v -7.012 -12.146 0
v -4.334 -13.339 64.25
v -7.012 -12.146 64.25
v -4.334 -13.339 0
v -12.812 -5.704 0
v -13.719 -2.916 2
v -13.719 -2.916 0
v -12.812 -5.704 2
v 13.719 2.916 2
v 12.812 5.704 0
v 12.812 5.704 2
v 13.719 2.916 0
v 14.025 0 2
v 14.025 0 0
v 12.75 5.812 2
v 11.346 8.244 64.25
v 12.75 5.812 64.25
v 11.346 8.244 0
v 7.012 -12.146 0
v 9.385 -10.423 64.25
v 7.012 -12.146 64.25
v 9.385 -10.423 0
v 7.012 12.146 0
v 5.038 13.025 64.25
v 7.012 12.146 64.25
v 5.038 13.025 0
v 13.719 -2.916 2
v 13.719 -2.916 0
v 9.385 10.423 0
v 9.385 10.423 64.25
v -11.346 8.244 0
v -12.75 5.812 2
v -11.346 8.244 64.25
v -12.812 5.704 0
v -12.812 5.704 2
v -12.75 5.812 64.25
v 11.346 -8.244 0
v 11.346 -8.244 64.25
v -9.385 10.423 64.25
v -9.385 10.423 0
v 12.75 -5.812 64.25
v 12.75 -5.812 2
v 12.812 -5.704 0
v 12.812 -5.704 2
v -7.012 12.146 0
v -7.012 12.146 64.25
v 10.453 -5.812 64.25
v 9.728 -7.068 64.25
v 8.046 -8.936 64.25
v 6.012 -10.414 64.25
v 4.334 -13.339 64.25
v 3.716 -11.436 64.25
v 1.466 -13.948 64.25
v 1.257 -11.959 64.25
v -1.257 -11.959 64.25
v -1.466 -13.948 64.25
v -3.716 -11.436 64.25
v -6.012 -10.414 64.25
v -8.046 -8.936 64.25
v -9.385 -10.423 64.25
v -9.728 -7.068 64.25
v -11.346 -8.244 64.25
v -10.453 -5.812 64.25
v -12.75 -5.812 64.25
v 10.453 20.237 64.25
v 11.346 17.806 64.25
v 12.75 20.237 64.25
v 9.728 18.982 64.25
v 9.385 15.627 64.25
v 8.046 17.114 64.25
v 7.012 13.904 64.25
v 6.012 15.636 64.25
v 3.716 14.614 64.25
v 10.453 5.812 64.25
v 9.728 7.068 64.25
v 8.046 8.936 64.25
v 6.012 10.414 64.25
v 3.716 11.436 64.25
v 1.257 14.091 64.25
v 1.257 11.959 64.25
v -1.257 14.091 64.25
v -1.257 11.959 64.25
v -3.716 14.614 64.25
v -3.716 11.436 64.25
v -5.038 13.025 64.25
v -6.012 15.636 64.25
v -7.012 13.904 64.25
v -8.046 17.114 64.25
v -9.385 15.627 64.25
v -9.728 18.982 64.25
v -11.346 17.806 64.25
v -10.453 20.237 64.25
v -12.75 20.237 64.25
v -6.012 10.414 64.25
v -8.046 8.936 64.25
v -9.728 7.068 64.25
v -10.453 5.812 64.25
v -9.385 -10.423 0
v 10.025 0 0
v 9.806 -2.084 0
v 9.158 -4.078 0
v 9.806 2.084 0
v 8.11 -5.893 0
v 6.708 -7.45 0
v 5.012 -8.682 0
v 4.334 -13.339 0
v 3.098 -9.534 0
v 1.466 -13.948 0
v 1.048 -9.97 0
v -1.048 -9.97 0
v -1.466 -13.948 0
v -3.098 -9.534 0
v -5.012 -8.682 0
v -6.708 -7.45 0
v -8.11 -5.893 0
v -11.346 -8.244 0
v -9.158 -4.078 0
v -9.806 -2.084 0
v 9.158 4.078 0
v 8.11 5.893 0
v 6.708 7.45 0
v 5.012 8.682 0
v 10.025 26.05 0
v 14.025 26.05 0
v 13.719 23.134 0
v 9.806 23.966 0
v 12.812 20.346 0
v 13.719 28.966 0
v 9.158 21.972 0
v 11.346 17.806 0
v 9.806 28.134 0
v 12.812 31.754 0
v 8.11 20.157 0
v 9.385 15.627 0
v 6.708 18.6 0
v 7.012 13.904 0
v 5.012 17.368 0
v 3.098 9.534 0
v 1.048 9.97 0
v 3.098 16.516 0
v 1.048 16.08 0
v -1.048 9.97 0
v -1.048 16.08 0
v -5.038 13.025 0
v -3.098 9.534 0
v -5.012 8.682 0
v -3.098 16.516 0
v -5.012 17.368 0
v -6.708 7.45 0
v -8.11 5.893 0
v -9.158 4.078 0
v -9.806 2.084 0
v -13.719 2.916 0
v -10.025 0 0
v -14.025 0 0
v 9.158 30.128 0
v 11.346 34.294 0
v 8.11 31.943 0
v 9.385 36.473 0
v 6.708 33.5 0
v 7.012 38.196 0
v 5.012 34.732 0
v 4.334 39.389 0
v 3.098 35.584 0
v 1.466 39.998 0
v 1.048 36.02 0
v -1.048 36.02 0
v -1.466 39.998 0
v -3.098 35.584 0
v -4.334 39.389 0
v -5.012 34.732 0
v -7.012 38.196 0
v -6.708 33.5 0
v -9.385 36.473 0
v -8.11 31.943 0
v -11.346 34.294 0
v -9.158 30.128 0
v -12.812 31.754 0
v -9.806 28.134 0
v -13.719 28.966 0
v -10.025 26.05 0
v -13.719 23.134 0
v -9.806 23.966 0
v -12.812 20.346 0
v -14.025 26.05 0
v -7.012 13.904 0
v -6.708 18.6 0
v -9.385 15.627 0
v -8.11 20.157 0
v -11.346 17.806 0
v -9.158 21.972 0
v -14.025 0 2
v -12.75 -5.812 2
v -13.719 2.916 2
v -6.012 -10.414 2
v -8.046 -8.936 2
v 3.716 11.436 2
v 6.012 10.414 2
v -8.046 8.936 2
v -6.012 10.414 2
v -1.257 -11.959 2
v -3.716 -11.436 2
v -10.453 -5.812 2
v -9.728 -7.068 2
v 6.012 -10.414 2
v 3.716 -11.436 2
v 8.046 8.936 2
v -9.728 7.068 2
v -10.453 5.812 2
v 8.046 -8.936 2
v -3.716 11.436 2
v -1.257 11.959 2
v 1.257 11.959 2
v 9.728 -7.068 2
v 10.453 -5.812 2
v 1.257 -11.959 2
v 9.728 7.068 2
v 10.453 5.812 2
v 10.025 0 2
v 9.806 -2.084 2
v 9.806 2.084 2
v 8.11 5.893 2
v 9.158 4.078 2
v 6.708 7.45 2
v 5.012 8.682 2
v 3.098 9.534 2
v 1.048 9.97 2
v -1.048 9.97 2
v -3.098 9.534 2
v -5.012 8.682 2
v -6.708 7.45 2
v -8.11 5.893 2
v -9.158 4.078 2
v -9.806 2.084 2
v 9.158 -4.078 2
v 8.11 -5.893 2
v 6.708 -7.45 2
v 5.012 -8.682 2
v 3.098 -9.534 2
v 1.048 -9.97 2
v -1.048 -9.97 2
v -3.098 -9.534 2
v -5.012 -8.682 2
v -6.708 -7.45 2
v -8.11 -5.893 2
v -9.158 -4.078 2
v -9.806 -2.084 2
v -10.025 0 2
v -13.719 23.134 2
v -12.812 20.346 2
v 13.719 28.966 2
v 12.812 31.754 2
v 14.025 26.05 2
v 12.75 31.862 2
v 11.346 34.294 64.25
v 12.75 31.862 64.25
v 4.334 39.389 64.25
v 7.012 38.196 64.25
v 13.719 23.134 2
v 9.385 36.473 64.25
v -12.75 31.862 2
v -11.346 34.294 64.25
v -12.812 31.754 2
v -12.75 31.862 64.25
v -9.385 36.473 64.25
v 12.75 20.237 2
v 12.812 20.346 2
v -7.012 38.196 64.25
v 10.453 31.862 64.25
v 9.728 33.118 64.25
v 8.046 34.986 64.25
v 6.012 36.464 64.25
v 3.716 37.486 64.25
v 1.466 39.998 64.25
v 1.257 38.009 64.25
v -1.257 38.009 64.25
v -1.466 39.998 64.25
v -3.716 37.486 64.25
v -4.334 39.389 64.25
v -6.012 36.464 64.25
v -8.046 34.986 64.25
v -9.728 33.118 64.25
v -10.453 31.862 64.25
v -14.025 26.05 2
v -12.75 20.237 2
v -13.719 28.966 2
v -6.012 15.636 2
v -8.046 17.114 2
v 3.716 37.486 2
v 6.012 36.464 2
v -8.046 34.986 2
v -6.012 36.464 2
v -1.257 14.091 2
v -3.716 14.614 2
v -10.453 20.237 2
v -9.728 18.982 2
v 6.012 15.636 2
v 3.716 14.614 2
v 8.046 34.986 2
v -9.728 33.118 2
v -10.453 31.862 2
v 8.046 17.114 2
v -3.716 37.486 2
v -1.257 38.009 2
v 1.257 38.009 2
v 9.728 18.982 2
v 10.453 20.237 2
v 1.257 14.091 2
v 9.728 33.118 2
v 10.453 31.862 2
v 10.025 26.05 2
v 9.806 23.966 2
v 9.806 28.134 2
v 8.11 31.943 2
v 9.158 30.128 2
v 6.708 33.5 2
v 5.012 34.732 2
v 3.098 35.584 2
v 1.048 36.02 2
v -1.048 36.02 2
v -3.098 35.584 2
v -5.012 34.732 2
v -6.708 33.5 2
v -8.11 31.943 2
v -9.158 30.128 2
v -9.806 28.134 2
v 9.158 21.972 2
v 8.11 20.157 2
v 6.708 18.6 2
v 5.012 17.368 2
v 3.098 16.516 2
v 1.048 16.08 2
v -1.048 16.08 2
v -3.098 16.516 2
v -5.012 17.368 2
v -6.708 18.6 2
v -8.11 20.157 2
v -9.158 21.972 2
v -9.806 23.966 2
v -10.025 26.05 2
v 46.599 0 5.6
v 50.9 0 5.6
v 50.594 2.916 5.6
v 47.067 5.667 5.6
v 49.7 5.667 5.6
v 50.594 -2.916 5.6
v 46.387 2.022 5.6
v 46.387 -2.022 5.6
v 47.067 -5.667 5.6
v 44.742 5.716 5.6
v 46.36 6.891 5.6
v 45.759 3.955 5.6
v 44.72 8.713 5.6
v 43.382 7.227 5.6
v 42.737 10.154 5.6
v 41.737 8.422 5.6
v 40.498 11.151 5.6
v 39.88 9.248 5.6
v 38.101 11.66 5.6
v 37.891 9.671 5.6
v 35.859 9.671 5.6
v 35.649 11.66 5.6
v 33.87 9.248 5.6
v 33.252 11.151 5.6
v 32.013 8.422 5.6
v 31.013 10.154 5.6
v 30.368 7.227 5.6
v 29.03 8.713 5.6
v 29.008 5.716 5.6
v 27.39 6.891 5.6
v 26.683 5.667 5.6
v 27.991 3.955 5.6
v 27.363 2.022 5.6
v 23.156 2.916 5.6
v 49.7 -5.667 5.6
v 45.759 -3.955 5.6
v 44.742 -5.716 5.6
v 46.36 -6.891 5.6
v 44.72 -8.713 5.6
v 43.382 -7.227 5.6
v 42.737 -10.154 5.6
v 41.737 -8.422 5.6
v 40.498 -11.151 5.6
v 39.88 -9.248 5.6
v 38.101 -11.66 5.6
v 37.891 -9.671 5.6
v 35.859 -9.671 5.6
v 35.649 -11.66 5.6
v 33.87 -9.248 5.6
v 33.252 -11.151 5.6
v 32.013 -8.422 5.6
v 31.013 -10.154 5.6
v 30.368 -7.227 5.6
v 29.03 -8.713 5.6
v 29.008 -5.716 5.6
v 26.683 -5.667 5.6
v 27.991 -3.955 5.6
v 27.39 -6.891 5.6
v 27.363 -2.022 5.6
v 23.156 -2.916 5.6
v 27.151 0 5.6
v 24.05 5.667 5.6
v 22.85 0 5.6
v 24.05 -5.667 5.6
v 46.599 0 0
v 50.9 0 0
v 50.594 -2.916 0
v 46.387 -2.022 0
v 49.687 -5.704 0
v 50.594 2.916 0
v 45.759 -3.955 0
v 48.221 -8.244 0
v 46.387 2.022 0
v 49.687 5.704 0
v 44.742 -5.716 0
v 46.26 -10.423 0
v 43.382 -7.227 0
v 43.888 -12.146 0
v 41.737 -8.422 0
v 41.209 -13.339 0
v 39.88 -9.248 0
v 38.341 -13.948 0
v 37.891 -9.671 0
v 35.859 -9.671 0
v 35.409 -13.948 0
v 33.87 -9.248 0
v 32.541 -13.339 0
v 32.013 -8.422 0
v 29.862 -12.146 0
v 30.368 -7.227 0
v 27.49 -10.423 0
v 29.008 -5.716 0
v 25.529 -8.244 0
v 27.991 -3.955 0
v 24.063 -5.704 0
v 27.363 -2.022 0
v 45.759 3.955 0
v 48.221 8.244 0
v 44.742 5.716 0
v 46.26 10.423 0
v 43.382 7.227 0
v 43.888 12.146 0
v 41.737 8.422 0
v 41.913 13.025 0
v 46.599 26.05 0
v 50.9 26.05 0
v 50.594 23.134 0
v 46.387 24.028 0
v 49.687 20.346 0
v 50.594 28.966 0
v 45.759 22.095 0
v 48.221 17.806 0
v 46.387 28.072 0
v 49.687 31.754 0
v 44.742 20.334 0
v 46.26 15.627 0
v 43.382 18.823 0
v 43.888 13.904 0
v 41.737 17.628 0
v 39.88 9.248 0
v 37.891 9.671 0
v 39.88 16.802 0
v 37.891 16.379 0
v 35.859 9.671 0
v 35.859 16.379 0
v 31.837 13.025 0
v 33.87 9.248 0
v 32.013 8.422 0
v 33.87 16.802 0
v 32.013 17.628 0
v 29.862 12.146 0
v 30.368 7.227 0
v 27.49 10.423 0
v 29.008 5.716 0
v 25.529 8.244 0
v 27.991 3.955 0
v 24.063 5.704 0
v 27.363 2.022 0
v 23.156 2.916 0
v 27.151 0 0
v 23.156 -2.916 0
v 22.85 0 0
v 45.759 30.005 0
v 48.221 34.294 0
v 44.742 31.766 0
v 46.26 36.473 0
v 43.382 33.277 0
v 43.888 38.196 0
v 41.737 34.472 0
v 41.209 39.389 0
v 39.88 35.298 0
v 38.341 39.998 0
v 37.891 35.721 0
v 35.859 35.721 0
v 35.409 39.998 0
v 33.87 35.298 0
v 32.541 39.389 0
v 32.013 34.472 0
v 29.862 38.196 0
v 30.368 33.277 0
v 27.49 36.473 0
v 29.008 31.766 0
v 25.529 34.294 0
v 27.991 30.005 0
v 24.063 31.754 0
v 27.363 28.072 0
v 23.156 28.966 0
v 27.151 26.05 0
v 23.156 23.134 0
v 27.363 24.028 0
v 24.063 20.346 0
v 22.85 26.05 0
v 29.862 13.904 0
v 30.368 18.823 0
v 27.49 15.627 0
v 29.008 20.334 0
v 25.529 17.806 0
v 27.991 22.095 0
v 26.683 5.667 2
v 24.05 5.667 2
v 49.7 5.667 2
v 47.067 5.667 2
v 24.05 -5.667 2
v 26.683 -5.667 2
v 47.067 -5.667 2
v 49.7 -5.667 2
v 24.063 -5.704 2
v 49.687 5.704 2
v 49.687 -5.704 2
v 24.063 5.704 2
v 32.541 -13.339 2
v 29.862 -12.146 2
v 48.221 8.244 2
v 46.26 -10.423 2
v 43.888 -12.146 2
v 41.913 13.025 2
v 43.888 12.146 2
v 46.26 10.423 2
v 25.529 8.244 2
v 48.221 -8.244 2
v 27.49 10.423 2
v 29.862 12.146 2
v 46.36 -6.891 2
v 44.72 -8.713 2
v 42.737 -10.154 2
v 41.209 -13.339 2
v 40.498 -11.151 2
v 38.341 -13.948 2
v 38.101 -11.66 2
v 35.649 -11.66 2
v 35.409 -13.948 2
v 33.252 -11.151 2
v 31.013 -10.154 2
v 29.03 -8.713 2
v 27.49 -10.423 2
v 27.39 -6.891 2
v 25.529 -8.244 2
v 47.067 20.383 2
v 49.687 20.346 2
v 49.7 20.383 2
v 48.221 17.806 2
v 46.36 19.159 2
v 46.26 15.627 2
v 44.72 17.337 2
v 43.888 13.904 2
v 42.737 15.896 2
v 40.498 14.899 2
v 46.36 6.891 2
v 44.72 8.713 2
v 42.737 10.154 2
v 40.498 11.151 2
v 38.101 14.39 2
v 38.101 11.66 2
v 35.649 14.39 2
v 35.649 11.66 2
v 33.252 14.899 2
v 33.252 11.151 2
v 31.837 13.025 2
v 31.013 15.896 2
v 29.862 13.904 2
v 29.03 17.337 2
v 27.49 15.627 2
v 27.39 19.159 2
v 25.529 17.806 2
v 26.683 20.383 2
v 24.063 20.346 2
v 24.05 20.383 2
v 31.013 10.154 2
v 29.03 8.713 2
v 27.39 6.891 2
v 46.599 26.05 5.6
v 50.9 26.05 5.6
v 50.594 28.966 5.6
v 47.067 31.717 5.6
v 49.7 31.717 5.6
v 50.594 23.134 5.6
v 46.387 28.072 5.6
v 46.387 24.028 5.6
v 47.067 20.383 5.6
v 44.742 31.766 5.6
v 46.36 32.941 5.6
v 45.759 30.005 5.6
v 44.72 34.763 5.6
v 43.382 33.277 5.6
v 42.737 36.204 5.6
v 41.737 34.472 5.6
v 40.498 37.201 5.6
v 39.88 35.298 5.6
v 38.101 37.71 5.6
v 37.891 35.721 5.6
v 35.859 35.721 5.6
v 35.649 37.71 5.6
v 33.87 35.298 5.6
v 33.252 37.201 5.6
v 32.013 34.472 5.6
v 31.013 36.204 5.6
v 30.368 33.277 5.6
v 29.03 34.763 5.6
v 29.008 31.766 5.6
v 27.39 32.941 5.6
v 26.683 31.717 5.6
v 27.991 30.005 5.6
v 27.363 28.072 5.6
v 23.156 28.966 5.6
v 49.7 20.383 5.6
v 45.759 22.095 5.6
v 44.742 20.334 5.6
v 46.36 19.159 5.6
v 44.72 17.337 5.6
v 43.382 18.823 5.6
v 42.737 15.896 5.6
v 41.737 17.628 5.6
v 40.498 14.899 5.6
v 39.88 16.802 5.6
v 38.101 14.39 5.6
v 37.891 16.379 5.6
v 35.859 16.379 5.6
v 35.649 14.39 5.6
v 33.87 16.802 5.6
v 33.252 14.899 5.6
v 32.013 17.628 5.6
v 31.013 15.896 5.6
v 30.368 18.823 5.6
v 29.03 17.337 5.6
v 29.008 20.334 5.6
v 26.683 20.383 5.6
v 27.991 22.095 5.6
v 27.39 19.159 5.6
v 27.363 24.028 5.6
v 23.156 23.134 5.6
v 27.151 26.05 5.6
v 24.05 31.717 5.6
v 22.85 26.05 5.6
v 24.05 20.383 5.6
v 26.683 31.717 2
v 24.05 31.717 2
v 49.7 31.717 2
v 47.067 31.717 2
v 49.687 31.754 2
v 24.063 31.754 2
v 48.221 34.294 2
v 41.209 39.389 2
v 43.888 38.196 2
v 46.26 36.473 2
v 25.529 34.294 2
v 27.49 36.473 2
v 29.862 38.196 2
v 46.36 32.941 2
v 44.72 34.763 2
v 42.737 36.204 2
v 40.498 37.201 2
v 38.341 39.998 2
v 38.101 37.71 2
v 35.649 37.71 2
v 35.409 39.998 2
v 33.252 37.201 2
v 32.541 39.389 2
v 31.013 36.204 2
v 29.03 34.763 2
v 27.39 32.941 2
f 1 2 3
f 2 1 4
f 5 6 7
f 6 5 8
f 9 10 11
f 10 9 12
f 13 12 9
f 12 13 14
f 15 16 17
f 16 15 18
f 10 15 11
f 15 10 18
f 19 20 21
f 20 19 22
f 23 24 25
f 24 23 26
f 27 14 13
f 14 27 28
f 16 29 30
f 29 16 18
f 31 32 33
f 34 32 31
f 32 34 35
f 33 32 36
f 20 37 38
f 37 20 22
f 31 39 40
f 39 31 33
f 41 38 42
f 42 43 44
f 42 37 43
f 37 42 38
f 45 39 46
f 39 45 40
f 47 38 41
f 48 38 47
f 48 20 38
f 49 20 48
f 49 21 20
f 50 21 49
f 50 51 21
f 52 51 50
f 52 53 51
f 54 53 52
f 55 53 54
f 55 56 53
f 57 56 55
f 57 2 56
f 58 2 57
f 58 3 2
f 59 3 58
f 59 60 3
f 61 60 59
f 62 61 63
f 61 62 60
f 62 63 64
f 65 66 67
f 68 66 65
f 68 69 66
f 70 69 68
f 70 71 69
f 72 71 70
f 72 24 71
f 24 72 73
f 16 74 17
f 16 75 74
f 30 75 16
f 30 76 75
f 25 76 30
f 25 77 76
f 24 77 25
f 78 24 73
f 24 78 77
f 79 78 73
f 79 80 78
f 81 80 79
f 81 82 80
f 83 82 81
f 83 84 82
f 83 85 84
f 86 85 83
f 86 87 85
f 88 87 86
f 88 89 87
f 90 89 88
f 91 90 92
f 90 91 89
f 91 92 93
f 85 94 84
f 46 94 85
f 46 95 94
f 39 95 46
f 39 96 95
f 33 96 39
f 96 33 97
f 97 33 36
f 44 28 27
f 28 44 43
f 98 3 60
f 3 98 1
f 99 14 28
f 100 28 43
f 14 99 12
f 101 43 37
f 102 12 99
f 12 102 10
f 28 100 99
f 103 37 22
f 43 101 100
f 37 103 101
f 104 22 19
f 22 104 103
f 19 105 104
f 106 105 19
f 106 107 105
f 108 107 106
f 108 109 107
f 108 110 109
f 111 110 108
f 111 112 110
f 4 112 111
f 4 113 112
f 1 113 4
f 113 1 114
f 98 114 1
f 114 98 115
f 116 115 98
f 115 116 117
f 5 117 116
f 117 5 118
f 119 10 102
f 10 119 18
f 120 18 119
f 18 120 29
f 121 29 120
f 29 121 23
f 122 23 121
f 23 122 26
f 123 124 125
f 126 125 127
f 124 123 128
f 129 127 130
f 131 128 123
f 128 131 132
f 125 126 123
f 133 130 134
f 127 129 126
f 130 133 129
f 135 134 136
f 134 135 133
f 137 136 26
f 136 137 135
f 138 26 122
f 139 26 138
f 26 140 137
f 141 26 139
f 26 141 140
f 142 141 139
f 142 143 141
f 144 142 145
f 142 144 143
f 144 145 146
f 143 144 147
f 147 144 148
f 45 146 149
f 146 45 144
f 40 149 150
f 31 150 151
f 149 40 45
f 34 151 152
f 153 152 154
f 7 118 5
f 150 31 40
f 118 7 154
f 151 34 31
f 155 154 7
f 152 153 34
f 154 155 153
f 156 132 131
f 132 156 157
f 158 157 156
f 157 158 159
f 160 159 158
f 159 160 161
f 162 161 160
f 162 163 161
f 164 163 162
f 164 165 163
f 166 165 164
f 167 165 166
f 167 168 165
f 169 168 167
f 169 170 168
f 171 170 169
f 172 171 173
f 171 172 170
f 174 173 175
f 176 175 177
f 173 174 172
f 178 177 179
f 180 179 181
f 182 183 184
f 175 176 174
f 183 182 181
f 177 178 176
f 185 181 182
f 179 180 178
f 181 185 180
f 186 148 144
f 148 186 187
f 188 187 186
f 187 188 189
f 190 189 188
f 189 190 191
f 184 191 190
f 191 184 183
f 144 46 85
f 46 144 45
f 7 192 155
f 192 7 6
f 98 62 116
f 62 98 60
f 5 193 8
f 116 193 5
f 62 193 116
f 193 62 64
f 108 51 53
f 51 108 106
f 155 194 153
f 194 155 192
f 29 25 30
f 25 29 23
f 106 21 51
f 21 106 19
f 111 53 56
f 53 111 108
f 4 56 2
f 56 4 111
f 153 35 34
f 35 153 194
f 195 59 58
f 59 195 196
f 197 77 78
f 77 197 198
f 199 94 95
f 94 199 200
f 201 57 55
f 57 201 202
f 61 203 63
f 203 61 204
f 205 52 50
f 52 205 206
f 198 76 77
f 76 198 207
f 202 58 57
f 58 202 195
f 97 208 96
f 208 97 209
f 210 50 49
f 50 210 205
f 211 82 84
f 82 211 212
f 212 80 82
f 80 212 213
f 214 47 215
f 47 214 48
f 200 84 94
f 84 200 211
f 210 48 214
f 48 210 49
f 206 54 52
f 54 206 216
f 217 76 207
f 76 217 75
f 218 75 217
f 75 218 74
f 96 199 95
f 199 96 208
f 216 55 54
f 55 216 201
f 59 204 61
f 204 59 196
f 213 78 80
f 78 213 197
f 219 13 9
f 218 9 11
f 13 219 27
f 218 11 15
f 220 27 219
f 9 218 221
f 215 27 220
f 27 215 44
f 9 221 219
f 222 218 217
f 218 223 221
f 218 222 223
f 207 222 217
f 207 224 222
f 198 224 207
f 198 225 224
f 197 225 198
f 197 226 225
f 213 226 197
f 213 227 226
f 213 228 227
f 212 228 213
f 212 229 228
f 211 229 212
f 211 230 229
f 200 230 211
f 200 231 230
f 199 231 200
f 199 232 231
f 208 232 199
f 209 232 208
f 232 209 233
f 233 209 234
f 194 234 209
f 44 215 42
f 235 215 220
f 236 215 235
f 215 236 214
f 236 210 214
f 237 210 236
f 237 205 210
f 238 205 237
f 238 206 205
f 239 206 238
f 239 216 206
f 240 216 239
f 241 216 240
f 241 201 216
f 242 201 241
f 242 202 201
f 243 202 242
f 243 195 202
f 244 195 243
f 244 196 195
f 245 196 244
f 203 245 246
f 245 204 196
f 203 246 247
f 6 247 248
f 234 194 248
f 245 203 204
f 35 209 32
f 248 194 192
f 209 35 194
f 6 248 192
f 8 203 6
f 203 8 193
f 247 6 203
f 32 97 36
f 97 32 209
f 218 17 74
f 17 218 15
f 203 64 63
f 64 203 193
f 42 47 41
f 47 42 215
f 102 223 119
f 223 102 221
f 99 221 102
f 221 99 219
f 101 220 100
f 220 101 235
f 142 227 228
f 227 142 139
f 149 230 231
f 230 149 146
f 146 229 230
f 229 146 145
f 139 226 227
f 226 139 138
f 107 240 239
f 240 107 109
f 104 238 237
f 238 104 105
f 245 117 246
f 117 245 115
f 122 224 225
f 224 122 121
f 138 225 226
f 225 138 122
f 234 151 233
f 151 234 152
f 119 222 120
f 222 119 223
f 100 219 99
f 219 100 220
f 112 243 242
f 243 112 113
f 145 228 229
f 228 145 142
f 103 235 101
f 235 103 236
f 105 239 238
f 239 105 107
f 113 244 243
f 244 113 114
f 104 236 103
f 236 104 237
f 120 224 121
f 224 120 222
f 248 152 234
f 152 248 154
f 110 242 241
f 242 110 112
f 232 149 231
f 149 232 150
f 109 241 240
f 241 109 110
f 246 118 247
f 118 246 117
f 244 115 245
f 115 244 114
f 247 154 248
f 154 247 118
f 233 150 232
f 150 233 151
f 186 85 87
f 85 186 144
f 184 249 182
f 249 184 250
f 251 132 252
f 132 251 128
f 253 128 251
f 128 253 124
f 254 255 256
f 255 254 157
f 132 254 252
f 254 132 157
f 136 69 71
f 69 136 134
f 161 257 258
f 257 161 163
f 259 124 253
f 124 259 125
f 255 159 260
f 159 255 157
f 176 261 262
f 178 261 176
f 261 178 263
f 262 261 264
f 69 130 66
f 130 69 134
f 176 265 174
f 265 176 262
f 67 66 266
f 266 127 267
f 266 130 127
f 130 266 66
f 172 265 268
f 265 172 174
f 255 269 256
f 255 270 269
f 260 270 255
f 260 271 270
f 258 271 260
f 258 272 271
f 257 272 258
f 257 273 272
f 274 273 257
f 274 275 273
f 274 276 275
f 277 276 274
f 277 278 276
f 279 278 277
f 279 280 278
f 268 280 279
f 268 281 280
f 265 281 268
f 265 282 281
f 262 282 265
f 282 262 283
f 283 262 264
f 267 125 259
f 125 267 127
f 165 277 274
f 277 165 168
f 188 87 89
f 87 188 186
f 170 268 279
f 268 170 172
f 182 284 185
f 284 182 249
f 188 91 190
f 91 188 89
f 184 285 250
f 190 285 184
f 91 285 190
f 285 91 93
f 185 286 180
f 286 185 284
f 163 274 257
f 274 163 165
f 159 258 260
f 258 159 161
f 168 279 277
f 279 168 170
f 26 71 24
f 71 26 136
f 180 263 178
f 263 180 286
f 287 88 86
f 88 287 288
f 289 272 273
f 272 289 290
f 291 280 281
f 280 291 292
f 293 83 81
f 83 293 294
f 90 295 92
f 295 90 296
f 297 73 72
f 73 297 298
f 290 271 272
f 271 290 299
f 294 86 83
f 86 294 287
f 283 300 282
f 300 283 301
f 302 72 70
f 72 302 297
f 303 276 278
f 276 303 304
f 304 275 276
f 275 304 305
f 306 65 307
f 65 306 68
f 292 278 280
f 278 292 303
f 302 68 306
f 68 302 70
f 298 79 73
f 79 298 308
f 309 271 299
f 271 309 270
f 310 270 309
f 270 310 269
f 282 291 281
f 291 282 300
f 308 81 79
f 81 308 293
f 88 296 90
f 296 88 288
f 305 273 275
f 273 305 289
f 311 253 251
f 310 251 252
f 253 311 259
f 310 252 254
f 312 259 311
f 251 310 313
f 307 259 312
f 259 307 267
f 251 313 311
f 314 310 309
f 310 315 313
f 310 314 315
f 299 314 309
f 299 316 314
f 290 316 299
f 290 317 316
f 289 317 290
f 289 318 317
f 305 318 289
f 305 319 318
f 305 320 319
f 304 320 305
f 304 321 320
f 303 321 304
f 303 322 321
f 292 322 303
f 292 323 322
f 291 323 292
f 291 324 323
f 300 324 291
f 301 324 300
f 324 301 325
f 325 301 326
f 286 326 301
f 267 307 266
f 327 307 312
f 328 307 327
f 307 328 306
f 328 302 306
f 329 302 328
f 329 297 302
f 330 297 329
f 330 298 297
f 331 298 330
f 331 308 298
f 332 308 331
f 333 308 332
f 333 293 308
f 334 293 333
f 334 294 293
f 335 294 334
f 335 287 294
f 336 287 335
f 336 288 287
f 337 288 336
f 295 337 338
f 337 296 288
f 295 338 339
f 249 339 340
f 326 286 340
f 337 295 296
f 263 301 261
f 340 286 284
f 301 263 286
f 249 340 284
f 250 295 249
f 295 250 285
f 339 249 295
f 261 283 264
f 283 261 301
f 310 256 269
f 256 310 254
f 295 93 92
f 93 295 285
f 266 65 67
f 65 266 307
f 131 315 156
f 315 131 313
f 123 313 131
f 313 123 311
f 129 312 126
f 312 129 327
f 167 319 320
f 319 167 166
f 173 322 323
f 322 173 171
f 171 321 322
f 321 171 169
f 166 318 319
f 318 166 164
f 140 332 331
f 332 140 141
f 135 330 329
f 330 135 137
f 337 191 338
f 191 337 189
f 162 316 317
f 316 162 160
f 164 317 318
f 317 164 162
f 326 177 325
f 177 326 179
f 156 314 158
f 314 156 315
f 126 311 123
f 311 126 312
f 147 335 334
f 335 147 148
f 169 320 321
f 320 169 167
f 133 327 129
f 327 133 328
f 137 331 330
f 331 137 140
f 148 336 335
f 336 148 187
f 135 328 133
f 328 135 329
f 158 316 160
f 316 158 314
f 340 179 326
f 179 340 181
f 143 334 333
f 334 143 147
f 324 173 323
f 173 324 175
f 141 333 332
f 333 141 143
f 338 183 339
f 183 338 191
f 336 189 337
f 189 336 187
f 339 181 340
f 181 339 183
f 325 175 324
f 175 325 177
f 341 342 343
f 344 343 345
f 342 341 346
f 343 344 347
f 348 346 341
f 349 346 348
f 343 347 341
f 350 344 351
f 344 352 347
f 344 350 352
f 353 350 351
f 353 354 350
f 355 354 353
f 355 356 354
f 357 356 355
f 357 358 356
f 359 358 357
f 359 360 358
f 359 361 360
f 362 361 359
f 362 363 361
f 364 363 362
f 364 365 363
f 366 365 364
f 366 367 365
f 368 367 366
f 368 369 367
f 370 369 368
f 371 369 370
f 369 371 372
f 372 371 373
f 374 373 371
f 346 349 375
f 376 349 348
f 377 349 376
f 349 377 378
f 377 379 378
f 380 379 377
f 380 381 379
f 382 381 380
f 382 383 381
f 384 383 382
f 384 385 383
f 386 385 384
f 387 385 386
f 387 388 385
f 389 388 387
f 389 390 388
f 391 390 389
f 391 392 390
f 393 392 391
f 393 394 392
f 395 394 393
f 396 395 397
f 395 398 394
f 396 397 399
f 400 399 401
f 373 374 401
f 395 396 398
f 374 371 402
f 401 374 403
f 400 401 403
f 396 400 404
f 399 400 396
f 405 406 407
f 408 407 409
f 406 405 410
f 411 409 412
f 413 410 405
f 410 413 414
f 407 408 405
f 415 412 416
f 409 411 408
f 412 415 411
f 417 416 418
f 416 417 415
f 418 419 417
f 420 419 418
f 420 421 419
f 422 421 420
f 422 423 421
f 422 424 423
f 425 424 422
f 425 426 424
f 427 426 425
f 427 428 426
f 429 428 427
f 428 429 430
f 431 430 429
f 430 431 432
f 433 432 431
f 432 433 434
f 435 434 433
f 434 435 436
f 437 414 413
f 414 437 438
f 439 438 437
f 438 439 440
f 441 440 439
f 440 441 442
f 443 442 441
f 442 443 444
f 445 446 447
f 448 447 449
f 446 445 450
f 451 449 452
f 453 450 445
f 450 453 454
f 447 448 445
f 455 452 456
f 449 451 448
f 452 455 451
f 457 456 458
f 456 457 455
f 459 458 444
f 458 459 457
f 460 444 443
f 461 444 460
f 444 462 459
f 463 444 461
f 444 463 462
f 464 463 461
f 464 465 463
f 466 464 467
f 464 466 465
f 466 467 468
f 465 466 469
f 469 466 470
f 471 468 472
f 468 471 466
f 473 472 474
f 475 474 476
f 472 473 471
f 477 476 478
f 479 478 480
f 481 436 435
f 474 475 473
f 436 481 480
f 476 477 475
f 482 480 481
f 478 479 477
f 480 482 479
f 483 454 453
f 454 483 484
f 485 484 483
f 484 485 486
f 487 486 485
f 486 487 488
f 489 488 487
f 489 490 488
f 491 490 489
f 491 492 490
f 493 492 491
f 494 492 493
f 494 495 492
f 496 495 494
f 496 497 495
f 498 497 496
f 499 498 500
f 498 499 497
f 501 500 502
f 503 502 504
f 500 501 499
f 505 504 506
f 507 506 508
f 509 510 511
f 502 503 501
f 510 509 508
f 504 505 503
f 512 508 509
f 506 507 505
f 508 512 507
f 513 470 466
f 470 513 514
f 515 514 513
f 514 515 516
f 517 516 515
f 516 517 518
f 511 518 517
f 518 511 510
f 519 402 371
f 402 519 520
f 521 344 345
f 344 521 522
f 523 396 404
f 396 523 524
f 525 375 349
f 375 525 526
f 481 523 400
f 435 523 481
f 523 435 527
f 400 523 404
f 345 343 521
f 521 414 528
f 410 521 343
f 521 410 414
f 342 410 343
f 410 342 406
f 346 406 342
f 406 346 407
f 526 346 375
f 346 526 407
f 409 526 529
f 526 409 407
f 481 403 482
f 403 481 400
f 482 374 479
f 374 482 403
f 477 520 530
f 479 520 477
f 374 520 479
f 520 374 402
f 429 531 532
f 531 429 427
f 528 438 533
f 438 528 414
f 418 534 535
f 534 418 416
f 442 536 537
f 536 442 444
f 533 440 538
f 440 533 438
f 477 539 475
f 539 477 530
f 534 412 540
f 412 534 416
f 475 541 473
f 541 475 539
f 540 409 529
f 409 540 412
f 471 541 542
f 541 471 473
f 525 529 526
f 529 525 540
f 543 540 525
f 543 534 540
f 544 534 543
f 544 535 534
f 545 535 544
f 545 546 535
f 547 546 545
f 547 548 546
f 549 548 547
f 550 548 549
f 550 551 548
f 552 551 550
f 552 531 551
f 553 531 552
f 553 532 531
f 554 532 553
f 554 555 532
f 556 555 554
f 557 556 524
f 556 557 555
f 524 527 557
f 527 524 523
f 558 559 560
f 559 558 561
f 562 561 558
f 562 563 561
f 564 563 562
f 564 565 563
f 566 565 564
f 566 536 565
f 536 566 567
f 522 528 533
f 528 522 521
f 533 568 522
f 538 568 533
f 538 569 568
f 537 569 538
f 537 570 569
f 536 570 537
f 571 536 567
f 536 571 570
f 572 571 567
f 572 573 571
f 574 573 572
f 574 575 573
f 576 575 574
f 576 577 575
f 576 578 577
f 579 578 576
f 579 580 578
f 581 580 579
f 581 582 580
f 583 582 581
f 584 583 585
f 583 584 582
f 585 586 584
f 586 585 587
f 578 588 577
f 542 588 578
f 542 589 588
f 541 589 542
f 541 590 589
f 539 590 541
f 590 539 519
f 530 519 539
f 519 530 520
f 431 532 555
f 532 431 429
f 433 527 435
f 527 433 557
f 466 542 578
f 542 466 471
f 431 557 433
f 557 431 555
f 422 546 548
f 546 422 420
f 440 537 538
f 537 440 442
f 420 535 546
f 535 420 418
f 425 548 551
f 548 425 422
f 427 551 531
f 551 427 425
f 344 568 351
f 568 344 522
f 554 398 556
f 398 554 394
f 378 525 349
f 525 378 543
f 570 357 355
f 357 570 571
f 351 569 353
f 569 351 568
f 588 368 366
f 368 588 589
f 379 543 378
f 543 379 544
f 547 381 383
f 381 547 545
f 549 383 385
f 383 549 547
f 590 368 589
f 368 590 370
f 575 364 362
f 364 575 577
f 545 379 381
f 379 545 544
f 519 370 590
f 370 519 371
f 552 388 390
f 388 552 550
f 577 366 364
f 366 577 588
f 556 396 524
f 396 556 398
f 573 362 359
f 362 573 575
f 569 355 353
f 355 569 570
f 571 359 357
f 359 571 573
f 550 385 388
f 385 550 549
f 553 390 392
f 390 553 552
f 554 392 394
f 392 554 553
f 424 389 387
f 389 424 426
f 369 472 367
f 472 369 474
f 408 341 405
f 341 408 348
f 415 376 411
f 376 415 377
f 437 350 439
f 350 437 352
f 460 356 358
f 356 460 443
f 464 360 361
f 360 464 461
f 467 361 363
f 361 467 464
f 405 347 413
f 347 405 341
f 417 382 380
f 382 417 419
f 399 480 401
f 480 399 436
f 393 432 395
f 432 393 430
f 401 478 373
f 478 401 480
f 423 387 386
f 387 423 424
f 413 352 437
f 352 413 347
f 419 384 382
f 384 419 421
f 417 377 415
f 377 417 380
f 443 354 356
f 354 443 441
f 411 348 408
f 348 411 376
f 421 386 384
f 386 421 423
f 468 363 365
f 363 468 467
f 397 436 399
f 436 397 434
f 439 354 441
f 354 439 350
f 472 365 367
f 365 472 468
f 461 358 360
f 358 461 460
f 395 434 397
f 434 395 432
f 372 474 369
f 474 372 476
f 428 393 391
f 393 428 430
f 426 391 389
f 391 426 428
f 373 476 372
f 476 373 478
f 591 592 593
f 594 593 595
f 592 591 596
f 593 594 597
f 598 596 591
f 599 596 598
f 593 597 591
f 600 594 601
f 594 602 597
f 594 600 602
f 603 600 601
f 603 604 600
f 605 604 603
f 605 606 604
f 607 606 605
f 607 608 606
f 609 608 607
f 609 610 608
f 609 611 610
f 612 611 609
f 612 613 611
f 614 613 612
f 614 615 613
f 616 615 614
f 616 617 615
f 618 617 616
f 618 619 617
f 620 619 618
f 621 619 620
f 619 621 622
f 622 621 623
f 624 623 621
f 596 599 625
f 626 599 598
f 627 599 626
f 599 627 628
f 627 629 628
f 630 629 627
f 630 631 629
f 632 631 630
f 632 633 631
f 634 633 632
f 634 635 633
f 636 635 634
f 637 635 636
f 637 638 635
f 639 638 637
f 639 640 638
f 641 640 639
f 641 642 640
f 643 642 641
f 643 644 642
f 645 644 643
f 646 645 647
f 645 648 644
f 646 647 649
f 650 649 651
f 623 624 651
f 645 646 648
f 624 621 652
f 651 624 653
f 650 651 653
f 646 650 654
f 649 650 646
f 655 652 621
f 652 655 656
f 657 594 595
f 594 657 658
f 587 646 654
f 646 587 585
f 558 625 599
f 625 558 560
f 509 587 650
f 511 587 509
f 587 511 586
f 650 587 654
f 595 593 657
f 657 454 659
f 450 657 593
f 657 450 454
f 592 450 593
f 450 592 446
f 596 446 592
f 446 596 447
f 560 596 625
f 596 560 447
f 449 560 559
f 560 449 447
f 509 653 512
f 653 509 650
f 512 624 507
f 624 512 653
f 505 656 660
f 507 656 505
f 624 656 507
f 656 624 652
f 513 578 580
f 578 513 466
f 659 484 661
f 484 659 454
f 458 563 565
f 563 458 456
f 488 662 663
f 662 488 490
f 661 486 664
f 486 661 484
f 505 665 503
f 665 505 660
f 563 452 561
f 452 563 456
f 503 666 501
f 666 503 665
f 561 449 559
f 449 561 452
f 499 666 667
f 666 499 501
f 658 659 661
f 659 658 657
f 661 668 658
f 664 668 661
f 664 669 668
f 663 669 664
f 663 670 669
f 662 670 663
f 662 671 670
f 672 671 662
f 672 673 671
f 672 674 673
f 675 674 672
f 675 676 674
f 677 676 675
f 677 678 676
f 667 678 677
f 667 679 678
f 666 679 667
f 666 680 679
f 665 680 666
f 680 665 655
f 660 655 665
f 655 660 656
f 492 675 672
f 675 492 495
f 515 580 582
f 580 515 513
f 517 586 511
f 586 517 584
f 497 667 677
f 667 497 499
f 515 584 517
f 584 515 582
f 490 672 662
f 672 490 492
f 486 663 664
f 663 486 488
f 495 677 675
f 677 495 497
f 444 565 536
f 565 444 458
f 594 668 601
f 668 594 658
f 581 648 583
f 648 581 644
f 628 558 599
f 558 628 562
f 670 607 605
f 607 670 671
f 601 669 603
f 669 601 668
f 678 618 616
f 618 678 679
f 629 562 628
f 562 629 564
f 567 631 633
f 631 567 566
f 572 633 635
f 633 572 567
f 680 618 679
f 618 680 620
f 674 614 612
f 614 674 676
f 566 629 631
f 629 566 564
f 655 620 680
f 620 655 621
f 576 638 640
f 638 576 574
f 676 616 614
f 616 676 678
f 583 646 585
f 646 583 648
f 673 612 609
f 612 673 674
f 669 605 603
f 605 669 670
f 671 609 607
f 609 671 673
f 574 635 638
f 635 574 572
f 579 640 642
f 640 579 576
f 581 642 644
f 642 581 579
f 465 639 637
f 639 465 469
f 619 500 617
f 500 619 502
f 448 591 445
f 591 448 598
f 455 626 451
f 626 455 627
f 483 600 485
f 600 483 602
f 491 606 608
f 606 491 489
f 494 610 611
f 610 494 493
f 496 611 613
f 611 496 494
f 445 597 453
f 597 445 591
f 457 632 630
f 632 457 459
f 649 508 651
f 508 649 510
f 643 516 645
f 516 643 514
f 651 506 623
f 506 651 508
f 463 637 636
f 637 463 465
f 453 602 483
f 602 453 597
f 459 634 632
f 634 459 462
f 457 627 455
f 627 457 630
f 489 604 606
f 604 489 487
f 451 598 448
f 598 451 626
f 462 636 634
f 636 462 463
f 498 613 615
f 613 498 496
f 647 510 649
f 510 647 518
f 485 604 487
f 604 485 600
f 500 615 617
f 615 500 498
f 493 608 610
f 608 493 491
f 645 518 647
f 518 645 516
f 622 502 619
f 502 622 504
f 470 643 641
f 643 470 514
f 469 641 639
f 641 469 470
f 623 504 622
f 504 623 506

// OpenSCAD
/*
 * PARAMETRIC COIN TUBES + CAP
 * VERSION 1.3.1
 * last update: 02/12/13
 * design by newq 
 * mod kitwallace (thanks!)
 */

// 
// the generated tubes insides are 2 coins higher than the number of coins they fit

coin_type = 0; // [ 0:1 Euro, 1:2 Euro, 2:50 Euro cents,  3:20 Euro cents, 4:10 Euro cents, 5:5 Euro cents, 6:2 Euro cent, 7: 1 Euro cent, 8: 1 US Dollar, 9: 0.50 US Dollar, 10: 0.25 US Dollar, 11: 0.10 US Dollar, 12: 0.05 US Dollar, 13: 0.01 US Dollar, 14: 2 Canadian Dollar, 15: 1 Canadian Dollar, 16: 0.50 Canadian Dollar, 17: 0.25 Canadian Dollar, 18: 0.10 Canadian Dollar, 19: 0.05 Canadian Dollar, 20: 0.01 Canadian Dollar, 21: 10 ATS Silver, 22: 5 ATS Silver]

// how many stacked coins should fit in a tube
number_of_coins = 25; 
number_of_tubes = 2; 

// Do you want to print the tubes?
generate_tube = 1; // [1:Yes, 0:No] 
// Do you want a cap to close the tube?
generate_cap = 1; // [1:Yes, 0:No] 
// thickness of wall and bottom (mm)
tube_wall = 2;  
// clearance from coin to wall of tube (mm) 
clearance = 0.4;
// if the cap fits too tight you might decrease slightly
fudge_factor = 0.975; 

// NOTHING TO SEE HERE :)

// coin data - name, diameter, height
coins = [ 
              ["1 Euro", 23.25, 2.33], 
              ["2 Euro", 25.75, 2.20],
              ["50 Euro cents", 24.25, 2.38],
              ["20 Euro cents", 22.25, 2.14],
              ["10 Euro cents", 19.75, 1.93],
              ["5 Euro cents", 21.25, 1.67],
              ["2 Euro cents", 18.75, 1.67],
              ["1 Euro cents", 16.25, 1.67],
              ["1 US Dollar", 26.50, 2.00],
              ["0.50 US Dollar", 30.61, 2.15],
              ["0.25 US Dollar", 24.26, 1.75],
              ["0.10 US Dollar", 17.91, 1.35],
              ["0.05 US Dollar", 21.21, 1.95],
              ["0.01 US Dollar", 19.05, 1.55],
              ["2 Canadian Dollar", 28.00, 1.80],
              ["1 Canadian Dollar", 26.50, 1.75],
              ["0.50 Canadian Dollar", 27.13, 1.95],
              ["0.25 Canadian Dollar", 23.88, 1.58],
              ["0.10 Canadian Dollar", 18.03, 1.22],
              ["0.05 Canadian Dollar", 21.2, 1.76],
              ["0.01 Canadian Dollar", 19.05, 1.45],
              ["10 ATS Silver", 27.05, 1.62],
              ["5 ATS Silver", 23.55, 1.35]
            ];

coin_diameter = coins[coin_type][1];
coin_height = coins[coin_type][2];

// generating the tubes
if (generate_tube) {
  assign(cyl_inner_h = (coin_height * number_of_coins) + (4 * tube_wall),
             cyl_inner_r = (coin_diameter / 2) + clearance,

             cyl_outer_h = (coin_height * number_of_coins) + (3 * tube_wall),
             cyl_outer_r = (coin_diameter / 2) + tube_wall + clearance,

             cutout_x = coin_diameter + (4 * tube_wall),
             cutout_y = (coin_diameter / 2),
             cutout_z = (coin_height * number_of_coins) + (3 * tube_wall)
             )


  for (z = [0 : (number_of_tubes-1)]){

	translate (v = [0, z * (cyl_outer_r * 2 - tube_wall), 0]){
		difference(){	
			difference(){
				difference() {
					// outer tube
					cylinder(h = cyl_outer_h, r = cyl_outer_r);
					// inner tube
					translate(v = [0, 0, tube_wall]) {
						cylinder(h = cyl_inner_h, r = cyl_inner_r);
					}
				}
				// round bottom cutout
				translate (v = [0, 0, ((cutout_z / 2) + tube_wall)]){
					cube(size = [cutout_x, cutout_y, cutout_z], center = true);
				}
			}
			// cutout
			translate (v = [0, 0, -tube_wall]){
				cylinder(h = (cyl_inner_h + tube_wall), r = (cyl_inner_r - tube_wall));
			}
		}
   }
}

}

// generating the tube tops

if (generate_cap) {
   assign (cyl_inner_h = 3*tube_wall - clearance,
               cyl_inner_r = ((coin_diameter / 2) + clearance) * fudge_factor,

               cyl_outer_h = tube_wall,
               cyl_outer_r = (coin_diameter / 2) + tube_wall + clearance,

               cutout_x = coin_diameter + (4 * tube_wall),
               cutout_y = (coin_diameter / 2) * fudge_factor,
               cutout_z = 3*tube_wall - clearance
             )
    translate([1.5 * coin_diameter + tube_wall, 0, 0]){
	for (z = [0 : (number_of_tubes-1)]){
		
		translate (v = [0, z * (cyl_outer_r * 2 - tube_wall), 0]){
			difference(){
				union(){		
					cylinder(h = cyl_outer_h, r = cyl_outer_r);
					cylinder(h = cyl_inner_h, r = cyl_inner_r);
				
					intersection(){
						translate([0,0,cutout_z/2]){
							cube(size = [cutout_x, cutout_y, cutout_z], center = true);
						}
						cylinder(h = cyl_outer_h+10, r = cyl_outer_r);
					}
				}
				
				translate([0,0,-(cyl_inner_h /2)]){
					cylinder(h = cyl_inner_h *2, r = cyl_inner_r - tube_wall);
				}			
			}		
		}
	}	
}
}
